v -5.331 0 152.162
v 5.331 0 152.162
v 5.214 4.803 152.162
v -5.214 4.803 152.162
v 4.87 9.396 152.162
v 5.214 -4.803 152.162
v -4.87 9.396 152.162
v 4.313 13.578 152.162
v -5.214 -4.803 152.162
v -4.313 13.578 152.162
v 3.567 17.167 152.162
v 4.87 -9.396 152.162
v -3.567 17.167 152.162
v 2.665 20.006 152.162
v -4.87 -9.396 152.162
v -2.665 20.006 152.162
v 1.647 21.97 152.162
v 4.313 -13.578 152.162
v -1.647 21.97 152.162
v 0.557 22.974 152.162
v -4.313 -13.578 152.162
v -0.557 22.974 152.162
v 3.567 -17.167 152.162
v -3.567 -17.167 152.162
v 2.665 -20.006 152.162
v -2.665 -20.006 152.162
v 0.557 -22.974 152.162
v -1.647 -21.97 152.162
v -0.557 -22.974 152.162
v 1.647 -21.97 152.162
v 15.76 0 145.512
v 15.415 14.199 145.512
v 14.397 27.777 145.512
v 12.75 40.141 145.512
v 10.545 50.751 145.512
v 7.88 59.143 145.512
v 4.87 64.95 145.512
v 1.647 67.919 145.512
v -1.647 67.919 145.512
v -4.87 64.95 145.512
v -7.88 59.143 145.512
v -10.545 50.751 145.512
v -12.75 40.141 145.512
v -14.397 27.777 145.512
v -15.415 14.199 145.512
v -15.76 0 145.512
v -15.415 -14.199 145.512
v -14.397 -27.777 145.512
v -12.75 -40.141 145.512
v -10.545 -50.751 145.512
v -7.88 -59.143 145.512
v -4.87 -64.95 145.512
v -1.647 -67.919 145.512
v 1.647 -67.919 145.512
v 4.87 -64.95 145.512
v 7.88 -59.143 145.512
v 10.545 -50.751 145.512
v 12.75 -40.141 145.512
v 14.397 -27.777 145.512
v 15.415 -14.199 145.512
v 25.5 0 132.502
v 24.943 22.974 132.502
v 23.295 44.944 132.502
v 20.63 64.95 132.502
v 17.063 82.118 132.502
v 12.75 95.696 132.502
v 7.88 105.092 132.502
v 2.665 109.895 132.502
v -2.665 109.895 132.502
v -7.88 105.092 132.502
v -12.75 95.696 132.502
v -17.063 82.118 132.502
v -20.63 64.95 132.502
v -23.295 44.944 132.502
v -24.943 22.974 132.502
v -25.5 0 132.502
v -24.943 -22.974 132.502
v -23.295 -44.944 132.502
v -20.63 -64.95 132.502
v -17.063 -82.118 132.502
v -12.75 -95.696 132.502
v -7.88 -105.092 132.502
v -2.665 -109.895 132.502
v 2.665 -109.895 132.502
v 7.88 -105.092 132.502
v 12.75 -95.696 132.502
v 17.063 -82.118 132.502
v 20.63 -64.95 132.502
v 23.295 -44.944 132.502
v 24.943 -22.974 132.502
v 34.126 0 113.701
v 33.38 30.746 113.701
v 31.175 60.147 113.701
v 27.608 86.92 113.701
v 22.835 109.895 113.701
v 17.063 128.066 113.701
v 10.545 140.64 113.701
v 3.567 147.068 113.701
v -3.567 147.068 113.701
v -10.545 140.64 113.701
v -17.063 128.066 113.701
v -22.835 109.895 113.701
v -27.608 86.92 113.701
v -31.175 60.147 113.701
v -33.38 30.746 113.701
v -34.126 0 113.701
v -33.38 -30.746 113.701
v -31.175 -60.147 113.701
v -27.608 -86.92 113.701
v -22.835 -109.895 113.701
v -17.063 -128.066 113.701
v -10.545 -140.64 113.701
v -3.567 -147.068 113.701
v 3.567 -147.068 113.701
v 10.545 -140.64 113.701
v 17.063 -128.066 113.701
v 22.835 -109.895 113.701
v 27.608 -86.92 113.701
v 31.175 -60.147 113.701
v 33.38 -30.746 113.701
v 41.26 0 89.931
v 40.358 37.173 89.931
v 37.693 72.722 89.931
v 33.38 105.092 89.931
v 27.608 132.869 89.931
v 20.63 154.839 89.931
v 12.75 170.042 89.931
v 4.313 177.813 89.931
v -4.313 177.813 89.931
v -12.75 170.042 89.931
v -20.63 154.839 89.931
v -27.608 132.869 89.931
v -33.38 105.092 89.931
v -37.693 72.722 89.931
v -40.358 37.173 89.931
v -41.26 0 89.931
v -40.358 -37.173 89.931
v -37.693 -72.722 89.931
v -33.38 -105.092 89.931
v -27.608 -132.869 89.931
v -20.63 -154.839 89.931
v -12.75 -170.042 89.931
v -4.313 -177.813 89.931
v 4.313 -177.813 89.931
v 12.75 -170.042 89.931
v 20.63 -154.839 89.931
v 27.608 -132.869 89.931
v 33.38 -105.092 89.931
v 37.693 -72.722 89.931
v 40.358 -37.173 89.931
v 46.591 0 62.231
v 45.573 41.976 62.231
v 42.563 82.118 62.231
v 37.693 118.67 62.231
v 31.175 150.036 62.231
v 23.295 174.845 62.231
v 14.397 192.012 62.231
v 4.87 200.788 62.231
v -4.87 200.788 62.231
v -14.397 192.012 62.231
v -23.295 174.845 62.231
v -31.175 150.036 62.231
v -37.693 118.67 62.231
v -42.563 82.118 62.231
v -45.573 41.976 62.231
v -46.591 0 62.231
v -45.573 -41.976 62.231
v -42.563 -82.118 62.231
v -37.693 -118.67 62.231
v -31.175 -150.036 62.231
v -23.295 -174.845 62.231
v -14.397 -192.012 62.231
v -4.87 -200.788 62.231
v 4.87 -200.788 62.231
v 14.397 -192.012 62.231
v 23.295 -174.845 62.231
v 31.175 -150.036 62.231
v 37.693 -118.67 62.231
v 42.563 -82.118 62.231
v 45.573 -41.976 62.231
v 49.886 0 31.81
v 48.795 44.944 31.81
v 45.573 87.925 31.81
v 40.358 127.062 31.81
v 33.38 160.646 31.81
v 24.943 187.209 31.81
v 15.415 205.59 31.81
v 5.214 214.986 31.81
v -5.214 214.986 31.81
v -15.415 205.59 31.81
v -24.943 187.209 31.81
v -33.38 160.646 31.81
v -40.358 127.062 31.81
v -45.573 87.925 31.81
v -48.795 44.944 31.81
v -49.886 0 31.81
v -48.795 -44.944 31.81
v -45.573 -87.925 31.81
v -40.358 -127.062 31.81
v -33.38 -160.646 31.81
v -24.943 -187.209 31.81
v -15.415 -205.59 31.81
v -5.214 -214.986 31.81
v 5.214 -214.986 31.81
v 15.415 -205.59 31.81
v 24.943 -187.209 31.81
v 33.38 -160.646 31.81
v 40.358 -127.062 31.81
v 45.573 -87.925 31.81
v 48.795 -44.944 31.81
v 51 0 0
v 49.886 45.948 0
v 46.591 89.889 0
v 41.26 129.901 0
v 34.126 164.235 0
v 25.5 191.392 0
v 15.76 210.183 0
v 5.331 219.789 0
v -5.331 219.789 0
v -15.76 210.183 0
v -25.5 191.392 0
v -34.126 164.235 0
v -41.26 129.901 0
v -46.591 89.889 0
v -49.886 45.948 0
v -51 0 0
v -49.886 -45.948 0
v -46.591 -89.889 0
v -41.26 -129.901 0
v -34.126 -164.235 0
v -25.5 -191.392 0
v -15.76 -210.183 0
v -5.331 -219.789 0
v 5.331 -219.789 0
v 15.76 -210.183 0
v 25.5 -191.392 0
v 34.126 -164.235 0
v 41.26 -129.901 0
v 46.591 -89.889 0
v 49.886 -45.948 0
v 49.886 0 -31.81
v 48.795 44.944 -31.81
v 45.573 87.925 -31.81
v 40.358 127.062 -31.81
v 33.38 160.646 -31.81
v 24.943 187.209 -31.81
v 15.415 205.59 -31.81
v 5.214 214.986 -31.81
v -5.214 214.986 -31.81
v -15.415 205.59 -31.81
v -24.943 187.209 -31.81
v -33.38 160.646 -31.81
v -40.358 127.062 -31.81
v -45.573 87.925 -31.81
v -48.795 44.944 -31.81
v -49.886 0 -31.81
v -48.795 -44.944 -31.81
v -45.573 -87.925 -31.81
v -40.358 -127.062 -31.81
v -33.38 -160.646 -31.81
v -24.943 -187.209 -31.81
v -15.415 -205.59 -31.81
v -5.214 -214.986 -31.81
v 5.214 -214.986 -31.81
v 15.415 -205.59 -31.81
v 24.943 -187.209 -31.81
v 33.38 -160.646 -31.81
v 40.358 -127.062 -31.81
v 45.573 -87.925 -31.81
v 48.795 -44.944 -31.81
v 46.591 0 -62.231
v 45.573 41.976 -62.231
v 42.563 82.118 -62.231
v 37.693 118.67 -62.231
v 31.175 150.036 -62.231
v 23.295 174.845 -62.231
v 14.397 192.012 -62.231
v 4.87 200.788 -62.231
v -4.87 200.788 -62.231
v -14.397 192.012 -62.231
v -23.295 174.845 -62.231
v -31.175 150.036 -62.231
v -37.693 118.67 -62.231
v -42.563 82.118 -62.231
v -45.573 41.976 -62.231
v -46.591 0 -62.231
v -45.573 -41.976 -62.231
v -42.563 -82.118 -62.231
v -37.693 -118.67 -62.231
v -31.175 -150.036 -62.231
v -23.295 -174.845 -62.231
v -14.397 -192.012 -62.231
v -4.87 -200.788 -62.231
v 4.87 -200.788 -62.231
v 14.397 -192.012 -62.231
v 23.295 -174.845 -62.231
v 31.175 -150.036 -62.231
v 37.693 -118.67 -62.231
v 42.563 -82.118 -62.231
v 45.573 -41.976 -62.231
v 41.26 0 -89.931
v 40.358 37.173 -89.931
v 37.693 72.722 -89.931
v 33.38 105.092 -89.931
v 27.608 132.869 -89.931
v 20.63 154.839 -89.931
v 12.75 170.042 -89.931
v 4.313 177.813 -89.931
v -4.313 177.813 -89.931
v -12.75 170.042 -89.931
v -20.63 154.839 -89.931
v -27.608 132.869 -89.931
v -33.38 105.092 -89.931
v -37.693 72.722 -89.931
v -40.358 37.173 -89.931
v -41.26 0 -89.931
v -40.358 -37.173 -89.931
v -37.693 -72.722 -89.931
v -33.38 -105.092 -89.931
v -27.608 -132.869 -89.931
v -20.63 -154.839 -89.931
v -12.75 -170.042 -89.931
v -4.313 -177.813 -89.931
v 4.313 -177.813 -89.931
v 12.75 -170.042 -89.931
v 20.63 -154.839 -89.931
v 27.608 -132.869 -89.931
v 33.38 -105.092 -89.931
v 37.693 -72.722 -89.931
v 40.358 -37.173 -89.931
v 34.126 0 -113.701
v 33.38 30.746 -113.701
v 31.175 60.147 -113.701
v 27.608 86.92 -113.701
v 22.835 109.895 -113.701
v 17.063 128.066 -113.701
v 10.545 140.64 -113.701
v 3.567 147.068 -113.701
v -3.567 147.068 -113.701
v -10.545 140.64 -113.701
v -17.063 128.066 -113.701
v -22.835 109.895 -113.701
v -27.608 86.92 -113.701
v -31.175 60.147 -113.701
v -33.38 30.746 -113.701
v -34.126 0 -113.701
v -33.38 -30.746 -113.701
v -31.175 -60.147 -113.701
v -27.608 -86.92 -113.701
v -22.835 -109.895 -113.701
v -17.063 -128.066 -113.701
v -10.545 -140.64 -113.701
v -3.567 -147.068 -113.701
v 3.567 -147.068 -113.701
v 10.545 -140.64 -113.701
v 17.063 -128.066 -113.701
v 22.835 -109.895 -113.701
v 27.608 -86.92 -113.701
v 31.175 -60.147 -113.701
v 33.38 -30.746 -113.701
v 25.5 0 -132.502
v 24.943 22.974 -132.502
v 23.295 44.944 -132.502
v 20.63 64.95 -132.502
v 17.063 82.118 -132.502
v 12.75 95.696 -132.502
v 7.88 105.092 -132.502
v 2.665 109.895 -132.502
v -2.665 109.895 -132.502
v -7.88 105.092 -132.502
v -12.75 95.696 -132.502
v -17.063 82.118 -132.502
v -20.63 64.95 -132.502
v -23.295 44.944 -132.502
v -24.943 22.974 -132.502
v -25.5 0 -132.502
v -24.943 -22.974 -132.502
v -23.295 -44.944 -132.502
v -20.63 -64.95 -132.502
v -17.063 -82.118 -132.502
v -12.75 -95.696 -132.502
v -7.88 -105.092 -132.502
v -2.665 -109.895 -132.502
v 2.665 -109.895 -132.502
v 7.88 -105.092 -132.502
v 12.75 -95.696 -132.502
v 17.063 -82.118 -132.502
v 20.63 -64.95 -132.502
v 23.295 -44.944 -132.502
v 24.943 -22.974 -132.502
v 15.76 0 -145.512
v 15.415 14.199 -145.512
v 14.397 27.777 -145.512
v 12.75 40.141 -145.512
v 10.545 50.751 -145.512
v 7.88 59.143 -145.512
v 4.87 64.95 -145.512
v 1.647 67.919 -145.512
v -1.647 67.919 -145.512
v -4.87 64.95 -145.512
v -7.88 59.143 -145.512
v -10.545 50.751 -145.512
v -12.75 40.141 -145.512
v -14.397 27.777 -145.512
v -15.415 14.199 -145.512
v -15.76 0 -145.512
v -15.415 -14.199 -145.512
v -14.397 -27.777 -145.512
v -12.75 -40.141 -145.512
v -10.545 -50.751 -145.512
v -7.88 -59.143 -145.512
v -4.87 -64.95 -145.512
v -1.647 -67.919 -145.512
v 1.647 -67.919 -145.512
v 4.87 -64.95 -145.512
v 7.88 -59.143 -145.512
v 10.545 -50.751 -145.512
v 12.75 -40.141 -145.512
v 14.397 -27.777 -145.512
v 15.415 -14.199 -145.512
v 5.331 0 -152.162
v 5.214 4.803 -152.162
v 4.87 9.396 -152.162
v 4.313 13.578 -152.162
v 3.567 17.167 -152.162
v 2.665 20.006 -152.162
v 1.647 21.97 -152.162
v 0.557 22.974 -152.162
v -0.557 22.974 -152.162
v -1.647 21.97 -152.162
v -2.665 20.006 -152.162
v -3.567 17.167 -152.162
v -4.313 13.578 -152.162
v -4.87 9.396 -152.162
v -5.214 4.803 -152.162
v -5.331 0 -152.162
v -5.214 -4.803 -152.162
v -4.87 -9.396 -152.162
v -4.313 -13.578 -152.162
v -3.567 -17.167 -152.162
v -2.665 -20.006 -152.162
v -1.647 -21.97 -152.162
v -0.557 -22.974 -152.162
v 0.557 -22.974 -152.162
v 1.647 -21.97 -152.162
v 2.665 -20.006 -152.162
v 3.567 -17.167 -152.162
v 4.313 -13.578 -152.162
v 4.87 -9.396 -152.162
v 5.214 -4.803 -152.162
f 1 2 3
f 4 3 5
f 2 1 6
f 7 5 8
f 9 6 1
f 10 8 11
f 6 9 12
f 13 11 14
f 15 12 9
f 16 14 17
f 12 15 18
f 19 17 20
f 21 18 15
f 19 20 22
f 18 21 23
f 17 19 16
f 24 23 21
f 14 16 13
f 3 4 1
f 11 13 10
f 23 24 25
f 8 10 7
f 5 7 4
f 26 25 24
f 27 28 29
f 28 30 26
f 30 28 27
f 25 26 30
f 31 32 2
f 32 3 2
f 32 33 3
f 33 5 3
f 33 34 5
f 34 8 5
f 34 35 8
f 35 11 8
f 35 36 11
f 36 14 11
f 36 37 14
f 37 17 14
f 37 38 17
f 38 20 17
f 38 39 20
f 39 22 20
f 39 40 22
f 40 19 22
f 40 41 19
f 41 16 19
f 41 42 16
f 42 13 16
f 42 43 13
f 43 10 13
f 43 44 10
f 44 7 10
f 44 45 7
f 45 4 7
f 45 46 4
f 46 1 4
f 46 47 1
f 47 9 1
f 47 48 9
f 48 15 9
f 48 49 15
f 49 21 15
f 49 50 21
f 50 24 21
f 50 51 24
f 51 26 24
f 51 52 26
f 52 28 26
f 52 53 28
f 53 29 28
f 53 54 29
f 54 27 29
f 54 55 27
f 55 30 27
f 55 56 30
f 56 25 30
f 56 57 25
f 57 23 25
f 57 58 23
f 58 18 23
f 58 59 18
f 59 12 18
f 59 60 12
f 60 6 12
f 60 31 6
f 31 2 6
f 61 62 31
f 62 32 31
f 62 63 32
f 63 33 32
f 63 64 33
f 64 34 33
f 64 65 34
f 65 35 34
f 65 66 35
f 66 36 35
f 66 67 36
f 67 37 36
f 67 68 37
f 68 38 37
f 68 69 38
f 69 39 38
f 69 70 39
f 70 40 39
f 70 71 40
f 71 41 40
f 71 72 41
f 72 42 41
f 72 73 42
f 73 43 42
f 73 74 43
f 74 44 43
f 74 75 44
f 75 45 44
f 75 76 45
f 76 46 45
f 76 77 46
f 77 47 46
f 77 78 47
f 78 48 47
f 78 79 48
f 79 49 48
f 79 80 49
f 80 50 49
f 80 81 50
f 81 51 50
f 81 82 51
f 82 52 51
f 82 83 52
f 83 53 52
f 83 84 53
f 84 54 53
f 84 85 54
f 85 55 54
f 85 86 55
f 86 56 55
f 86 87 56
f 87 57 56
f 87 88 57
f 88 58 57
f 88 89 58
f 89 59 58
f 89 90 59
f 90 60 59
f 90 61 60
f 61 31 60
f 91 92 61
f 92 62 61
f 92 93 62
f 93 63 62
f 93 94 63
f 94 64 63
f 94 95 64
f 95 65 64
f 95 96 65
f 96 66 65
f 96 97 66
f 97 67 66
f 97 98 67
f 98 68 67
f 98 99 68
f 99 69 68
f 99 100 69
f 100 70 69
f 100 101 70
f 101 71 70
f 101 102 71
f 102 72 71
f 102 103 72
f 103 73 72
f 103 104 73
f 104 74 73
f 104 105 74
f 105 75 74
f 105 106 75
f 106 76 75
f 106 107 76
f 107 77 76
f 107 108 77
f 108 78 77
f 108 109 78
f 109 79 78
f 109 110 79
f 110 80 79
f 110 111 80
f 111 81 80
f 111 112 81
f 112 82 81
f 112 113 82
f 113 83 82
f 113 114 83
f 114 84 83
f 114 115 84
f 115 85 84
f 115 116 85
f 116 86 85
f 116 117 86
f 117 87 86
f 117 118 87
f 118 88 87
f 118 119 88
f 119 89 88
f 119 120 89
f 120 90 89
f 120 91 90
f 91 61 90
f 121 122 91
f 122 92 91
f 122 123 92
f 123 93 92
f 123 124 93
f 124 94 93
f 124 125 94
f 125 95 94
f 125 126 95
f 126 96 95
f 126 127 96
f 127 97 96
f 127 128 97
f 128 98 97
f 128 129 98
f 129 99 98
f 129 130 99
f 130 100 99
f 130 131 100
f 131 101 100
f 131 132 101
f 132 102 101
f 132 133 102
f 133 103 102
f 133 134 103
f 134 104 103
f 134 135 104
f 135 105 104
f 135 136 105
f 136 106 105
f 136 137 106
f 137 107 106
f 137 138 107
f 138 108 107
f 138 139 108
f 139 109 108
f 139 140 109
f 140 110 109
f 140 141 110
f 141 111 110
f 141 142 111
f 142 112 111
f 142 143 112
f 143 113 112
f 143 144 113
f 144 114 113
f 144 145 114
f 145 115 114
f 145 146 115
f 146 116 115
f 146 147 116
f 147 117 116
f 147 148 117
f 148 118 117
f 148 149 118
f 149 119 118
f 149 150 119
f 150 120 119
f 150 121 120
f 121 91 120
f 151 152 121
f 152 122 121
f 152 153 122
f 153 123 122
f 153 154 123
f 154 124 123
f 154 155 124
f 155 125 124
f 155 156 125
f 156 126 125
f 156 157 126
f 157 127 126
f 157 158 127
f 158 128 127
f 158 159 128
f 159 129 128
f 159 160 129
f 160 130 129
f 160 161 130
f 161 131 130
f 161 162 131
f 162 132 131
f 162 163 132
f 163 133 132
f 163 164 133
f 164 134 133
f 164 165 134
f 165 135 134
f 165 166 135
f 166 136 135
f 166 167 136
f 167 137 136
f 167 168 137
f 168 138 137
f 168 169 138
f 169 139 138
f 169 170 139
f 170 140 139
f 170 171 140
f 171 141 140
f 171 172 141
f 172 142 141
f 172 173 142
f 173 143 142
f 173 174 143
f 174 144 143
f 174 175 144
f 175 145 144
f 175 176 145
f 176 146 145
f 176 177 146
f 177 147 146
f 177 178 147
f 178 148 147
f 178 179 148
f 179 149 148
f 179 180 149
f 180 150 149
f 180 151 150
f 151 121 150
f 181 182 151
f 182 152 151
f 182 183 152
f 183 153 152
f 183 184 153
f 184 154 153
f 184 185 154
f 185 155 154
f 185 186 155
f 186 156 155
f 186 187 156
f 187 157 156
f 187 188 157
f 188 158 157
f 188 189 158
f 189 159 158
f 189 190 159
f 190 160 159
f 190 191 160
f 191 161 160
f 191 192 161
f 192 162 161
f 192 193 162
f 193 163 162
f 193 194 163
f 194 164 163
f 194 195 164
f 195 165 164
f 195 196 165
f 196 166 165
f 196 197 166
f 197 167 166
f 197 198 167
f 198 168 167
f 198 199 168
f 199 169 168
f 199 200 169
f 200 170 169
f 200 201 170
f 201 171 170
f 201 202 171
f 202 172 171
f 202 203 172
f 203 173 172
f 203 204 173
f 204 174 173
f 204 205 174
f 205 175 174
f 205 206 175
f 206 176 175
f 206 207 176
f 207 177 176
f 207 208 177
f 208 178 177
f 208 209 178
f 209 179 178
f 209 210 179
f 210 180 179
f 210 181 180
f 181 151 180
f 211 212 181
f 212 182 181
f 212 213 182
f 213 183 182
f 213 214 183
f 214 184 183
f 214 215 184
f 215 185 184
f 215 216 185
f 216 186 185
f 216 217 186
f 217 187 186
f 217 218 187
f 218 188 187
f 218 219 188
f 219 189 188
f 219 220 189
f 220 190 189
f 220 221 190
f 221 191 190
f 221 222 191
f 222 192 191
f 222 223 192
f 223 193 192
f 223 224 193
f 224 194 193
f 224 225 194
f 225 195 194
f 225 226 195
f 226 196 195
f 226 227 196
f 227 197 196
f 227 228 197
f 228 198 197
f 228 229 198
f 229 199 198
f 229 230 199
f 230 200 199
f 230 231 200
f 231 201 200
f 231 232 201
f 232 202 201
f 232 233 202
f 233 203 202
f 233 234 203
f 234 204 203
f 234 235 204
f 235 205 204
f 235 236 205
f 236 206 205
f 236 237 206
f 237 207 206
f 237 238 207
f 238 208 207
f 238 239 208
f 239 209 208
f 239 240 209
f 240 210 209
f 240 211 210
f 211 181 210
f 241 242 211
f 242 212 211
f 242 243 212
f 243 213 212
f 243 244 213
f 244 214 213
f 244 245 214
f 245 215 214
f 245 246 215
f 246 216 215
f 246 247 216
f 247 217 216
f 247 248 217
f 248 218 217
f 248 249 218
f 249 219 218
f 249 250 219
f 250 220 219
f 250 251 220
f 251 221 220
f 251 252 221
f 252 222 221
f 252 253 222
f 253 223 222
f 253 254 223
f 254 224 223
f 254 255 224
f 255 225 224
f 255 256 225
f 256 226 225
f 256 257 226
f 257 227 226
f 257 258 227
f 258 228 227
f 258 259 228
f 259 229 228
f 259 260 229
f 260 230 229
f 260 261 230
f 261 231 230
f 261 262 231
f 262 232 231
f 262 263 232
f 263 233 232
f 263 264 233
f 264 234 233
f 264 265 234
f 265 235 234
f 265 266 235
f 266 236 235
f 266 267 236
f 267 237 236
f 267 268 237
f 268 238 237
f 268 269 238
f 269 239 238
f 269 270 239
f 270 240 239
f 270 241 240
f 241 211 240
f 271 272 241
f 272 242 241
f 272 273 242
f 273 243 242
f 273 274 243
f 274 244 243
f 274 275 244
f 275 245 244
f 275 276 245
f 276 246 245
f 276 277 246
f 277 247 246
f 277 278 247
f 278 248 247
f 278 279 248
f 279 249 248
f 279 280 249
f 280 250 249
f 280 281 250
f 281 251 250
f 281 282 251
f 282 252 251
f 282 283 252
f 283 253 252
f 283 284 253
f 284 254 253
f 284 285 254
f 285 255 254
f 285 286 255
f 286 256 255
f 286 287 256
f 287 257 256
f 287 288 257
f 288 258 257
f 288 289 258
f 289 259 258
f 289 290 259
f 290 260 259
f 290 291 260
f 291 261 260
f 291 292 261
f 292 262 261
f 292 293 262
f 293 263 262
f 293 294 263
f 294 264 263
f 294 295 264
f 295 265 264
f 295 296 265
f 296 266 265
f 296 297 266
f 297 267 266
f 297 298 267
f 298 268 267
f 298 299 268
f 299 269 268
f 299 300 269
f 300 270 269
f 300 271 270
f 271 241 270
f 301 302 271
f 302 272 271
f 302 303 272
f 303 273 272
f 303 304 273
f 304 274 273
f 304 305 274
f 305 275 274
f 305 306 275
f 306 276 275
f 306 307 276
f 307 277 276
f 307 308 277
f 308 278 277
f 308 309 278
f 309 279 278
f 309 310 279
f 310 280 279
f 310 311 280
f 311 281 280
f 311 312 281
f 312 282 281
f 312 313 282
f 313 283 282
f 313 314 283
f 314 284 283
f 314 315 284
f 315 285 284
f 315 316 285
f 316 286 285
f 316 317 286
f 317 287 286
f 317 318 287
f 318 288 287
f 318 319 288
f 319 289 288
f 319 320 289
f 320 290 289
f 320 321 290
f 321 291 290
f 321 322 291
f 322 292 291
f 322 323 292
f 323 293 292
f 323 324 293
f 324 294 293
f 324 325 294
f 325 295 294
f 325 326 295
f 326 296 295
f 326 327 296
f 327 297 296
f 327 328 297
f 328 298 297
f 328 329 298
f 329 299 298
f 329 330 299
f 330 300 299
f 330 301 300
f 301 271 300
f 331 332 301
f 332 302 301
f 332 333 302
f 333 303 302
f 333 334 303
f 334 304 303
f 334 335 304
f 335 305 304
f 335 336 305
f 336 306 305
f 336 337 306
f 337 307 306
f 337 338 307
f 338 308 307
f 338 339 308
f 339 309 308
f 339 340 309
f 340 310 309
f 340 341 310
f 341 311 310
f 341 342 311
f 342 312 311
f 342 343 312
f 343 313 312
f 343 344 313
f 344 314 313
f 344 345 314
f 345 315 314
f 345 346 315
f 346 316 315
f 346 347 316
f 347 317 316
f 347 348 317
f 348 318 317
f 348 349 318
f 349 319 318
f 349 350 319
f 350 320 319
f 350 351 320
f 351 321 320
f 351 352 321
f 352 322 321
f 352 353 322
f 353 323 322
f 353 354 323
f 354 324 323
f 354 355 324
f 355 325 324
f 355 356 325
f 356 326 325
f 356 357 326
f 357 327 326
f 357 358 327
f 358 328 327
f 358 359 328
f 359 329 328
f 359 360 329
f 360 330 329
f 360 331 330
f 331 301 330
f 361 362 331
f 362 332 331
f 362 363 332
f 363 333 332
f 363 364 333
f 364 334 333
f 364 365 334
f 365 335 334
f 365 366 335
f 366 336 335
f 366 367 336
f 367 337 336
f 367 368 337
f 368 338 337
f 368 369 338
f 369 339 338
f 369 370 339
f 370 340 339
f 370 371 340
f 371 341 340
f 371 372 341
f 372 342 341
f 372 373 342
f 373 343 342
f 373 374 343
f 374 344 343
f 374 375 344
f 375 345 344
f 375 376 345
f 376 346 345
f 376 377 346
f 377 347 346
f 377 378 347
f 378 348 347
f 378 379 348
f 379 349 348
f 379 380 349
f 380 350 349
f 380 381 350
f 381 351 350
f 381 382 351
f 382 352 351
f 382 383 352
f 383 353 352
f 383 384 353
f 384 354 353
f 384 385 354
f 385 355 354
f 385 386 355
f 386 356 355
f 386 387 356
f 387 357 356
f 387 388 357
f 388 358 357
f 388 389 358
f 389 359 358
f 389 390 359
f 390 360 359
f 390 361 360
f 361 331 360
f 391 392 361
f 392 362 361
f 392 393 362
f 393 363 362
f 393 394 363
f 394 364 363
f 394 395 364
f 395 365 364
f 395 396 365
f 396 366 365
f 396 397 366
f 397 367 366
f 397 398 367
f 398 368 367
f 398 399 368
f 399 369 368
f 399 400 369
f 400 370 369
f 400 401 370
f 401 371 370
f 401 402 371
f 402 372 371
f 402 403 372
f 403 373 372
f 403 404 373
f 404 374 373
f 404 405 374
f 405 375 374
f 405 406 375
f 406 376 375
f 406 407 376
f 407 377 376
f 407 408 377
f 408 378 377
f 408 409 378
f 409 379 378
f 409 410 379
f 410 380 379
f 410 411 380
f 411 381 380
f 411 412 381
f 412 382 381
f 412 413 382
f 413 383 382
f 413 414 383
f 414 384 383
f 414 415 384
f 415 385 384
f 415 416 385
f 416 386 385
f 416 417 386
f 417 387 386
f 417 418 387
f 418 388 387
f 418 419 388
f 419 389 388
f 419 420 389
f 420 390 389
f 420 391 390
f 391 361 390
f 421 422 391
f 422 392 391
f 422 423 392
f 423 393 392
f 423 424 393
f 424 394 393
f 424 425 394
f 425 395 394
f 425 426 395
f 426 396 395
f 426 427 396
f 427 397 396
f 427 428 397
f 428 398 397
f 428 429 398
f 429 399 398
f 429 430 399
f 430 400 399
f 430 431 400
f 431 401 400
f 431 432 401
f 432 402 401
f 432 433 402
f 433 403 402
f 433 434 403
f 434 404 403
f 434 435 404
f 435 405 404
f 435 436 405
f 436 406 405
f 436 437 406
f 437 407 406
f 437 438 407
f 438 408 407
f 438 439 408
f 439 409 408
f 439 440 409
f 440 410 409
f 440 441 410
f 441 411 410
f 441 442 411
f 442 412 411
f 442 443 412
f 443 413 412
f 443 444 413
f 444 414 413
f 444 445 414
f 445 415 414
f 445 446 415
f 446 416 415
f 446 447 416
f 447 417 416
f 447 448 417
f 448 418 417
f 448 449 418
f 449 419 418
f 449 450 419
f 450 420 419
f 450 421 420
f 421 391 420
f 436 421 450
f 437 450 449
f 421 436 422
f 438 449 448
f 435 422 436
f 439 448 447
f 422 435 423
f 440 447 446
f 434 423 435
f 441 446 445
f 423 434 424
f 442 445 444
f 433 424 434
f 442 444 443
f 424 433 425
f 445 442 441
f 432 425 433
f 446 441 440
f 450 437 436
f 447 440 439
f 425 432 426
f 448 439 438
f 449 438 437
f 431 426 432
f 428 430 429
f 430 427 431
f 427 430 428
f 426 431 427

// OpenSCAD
// Generated by SolidPython 1.0.1 on 2020-07-29 00:46:45


scale(v = [3, 13, 9]) {
	sphere(r = 17);
}
/***********************************************
*********      SolidPython code:      **********
************************************************
 
# import packages: SolidPython
from solid import *
from solid.utils import *
from itertools import chain, combinations, permutations


class Resize:

    def __init__(self, scad_file):
        self.scad_file = scad_file
        #self.scad_file = import_scad(scad_file)
        # cone/cylinder param:
        self.r1 = 0
        self.r2 = 0
        self.h = 0
        # rectangular prism param:
        self.w = 0
        self.l = 0
        # ellipse param:
        self.r = 0

    # import OpenScad code (file name corresponds to shape)


    # classify shape + parameters
    def assign(self, param1, param2, param3):
        if self.scad_file == 'cone.scad':
            self.r1 = param1
            self.r2 = param2
            self.h = param3
        elif self.scad_file == 'cylinder.scad':
            self.r1 = param1
            self.r2 = param2
            self.h = param3
        elif self.scad_file == 'rectangularPrism.scad':
            self.h = param1
            self.l = param2
            self.w = param3
        else:
            self.r = param1
            self.h = param2

    # resize parameters
    def iterate(self):
        x = range(3, 20, 2)
        i = 1
        if self.scad_file == 'cone.scad':
            tempList = list(permutations(x, 2))
            for temp in tempList:
                param1 = temp[0]
                param2 = temp[1]
                filepath = 'produced_scad_files/' + 'cone' + str(param1) + '_' + str(param2) + '_' + '.scad'
                scad_render_to_file(cylinder(h=param1, r1=param2, r2=0), filepath)

        elif self.scad_file == 'cylinder.scad':
            tempList = list(permutations(x, 3))
            for temp in tempList:
                param1 = temp[0]
                param2 = temp[1]
                filepath = 'produced_scad_files/' + 'cylinder' + str(param1) + '_' + str(param2) + '_' + '.scad'
                scad_render_to_file(cylinder(h=param1, r1=param2, r2=param2), filepath)

        elif self.scad_file == 'rectangularPrism.scad':
            tempList = list(permutations(x, 3))
            for temp in tempList:
                param1 = temp[0]
                param2 = temp[1]
                param3 = temp[2]
                filepath = 'produced_scad_files/' + 'rectangularPrism' + str(param1) + '_' + str(param2) + '_' + str(
                    param3) + '.scad'
                scad_render_to_file(cube(size=(param1, param2, param3)), filepath)

        elif self.scad_file == 'ellipse.scad':
            tempList = list(permutations(x, 4))
            for temp in tempList:
                param1 = temp[0]
                param2 = temp[1]
                param3 = temp[2]
                param4 = temp[3]
                filepath = 'produced_scad_files/' + 'ellipse' + str(param1) + '_' + str(param2) + '_' + str(param3) + '_' + str(param4) + '.scad'
                scad_render_to_file(scale([param1, param2, param3])(sphere(r=param4)), filepath)

    def render_to_scadfile(self):
        scad_render_to_file(scad, 'example.scad') 
 
************************************************/
